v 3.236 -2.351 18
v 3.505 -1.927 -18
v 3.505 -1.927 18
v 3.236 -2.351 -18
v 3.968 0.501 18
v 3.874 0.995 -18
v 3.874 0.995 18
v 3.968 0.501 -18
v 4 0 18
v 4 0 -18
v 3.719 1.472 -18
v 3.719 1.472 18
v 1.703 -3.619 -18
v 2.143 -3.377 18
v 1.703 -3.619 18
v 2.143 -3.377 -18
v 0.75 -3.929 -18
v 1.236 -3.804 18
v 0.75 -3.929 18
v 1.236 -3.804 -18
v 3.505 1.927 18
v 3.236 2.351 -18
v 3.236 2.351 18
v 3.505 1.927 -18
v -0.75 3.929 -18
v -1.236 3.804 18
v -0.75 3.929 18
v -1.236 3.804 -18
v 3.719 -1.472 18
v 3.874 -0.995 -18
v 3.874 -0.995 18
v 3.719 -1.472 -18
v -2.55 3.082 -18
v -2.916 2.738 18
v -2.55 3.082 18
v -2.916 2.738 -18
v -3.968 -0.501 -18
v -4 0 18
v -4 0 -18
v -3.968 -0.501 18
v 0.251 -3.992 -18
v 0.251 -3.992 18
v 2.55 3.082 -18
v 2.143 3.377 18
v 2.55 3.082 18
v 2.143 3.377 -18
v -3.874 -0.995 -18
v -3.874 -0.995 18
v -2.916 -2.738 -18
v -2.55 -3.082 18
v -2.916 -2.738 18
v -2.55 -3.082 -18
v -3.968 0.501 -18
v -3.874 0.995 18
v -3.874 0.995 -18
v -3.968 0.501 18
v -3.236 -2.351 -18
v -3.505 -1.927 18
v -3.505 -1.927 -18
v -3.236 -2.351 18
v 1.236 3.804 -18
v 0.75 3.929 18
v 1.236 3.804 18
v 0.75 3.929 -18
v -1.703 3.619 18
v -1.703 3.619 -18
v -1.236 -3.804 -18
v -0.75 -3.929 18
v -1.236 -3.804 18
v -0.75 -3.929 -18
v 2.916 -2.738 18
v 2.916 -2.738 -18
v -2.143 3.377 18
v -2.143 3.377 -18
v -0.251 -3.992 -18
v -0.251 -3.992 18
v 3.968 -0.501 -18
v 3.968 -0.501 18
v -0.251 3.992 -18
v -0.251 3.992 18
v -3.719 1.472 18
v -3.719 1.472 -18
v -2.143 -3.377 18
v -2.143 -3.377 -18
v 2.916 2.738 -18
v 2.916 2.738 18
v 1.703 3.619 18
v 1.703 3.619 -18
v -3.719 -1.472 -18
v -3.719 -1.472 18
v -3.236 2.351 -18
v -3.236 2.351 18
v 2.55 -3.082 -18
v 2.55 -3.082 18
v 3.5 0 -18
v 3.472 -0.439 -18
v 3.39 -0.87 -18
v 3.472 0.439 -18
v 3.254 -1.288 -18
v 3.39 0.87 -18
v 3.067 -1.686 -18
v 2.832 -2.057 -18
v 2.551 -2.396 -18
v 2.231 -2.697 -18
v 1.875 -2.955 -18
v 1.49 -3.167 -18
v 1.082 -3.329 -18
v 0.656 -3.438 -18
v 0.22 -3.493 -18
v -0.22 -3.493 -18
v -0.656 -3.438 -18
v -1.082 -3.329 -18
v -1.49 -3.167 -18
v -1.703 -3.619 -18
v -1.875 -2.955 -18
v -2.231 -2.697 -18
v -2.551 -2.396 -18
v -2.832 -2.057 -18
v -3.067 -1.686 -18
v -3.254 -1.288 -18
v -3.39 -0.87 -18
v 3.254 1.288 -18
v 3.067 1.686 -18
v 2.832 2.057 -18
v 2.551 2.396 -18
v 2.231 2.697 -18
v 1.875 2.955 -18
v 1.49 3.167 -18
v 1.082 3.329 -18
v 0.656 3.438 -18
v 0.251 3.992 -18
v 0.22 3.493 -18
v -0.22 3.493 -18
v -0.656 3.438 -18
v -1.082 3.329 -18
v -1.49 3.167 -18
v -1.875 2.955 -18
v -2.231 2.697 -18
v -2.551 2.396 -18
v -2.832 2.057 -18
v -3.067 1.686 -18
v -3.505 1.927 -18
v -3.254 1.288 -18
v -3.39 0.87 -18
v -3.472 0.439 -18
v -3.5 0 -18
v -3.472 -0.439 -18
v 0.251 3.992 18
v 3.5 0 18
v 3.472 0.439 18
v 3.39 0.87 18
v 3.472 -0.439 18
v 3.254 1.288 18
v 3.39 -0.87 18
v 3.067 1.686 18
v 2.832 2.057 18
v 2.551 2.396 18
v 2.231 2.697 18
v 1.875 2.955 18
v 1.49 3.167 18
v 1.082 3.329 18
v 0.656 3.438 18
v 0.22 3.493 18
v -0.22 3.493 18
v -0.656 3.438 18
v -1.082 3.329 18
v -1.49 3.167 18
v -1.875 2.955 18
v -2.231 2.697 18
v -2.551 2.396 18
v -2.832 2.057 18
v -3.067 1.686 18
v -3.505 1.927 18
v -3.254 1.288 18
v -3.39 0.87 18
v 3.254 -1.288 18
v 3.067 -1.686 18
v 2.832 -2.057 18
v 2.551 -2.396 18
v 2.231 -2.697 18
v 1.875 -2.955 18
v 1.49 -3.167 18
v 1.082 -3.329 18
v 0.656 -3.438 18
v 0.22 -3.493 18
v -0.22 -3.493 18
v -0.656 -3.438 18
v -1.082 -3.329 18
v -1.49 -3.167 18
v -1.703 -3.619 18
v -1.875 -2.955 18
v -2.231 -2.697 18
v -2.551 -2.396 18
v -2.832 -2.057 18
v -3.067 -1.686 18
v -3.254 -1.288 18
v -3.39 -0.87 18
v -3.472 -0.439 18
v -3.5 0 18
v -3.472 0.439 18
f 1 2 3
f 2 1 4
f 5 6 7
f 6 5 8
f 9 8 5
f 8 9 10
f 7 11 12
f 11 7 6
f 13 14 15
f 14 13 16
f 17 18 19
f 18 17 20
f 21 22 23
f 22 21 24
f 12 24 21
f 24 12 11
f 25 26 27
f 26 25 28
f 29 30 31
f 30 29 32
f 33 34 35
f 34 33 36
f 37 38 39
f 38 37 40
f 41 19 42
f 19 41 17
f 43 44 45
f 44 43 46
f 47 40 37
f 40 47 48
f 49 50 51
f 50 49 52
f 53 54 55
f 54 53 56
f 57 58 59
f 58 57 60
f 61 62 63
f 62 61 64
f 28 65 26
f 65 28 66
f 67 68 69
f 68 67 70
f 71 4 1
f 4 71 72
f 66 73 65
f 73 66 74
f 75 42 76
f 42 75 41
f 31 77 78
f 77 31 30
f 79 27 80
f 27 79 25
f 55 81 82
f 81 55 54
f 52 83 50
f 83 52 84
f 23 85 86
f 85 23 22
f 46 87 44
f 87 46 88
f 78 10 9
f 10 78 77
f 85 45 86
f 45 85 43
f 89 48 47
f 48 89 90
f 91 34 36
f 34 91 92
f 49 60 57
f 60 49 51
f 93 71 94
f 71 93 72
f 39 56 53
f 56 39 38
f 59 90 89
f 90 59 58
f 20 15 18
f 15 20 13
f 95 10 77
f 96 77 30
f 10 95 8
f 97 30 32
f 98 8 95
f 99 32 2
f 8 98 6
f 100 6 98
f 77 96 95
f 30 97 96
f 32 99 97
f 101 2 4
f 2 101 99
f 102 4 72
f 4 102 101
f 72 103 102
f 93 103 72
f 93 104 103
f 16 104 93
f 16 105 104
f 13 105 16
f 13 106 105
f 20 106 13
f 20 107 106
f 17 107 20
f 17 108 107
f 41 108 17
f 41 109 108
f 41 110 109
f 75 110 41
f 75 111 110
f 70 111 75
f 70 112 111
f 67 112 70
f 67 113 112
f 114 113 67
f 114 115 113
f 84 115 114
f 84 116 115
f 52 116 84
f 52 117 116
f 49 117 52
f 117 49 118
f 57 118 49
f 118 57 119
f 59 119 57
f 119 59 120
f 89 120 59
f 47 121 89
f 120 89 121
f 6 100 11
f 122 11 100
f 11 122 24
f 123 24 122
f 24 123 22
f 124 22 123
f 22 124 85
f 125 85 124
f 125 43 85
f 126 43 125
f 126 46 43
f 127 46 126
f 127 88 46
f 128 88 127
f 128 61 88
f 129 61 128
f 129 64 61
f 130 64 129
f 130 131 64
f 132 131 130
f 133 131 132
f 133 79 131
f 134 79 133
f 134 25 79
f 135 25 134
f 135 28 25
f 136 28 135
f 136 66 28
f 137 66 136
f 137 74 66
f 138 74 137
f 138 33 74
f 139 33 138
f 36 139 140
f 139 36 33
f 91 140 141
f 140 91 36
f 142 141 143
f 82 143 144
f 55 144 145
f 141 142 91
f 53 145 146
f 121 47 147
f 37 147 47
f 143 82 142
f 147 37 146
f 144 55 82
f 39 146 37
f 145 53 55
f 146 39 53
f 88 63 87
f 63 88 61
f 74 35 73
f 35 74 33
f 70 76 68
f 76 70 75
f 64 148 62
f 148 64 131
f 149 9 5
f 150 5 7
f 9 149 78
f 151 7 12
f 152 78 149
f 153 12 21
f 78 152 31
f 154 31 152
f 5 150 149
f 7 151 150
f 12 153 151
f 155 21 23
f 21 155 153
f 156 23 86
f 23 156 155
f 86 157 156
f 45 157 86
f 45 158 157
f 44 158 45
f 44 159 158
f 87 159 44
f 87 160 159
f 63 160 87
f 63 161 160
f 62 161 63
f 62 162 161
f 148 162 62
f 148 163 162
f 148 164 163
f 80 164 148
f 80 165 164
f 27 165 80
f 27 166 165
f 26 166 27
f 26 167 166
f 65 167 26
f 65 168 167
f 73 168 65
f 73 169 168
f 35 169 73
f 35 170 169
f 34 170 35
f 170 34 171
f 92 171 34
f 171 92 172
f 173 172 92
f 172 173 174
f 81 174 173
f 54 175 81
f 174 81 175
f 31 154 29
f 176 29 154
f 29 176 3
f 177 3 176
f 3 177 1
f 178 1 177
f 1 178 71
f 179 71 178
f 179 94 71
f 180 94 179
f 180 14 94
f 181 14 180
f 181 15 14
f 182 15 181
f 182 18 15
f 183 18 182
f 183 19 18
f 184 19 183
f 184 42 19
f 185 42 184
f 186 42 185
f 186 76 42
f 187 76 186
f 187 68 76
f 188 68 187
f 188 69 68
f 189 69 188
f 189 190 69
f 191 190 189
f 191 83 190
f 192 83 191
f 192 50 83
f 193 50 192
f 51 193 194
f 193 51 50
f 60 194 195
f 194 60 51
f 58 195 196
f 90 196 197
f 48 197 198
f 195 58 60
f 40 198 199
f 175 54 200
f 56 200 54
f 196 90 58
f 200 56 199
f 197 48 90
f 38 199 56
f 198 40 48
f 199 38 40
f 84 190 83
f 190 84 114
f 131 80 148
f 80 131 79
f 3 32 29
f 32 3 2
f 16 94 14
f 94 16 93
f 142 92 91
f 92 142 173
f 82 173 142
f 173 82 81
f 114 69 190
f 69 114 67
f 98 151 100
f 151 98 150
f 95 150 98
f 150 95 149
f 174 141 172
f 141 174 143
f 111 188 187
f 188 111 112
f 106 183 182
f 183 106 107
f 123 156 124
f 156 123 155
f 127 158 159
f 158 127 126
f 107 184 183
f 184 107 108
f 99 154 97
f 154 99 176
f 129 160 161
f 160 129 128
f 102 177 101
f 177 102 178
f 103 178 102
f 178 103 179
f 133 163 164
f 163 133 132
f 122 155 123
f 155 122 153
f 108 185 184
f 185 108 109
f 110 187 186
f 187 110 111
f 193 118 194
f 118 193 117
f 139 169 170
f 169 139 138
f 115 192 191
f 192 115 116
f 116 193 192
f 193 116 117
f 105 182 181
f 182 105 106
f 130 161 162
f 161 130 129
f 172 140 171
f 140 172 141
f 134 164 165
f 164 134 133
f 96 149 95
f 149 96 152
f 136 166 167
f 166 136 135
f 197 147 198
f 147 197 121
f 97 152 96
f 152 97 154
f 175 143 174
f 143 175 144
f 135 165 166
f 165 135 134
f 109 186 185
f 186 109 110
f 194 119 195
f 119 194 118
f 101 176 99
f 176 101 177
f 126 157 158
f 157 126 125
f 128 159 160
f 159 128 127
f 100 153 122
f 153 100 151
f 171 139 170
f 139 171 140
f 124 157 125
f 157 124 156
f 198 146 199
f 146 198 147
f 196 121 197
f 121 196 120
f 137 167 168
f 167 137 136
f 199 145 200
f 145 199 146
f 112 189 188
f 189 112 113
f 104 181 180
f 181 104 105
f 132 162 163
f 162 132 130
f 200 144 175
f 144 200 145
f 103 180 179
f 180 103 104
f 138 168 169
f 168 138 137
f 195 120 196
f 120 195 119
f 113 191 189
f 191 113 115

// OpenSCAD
$fn = 50;


difference() {
	union() {
		translate(v = [0, 0, -18.0000000000]) {
			cylinder(h = 36, r = 4.0000000000);
		}
	}
	union() {
		translate(v = [0, 0, -100.0000000000]) {
			cylinder(h = 200, r = 3.5000000000);
		}
	}
}
